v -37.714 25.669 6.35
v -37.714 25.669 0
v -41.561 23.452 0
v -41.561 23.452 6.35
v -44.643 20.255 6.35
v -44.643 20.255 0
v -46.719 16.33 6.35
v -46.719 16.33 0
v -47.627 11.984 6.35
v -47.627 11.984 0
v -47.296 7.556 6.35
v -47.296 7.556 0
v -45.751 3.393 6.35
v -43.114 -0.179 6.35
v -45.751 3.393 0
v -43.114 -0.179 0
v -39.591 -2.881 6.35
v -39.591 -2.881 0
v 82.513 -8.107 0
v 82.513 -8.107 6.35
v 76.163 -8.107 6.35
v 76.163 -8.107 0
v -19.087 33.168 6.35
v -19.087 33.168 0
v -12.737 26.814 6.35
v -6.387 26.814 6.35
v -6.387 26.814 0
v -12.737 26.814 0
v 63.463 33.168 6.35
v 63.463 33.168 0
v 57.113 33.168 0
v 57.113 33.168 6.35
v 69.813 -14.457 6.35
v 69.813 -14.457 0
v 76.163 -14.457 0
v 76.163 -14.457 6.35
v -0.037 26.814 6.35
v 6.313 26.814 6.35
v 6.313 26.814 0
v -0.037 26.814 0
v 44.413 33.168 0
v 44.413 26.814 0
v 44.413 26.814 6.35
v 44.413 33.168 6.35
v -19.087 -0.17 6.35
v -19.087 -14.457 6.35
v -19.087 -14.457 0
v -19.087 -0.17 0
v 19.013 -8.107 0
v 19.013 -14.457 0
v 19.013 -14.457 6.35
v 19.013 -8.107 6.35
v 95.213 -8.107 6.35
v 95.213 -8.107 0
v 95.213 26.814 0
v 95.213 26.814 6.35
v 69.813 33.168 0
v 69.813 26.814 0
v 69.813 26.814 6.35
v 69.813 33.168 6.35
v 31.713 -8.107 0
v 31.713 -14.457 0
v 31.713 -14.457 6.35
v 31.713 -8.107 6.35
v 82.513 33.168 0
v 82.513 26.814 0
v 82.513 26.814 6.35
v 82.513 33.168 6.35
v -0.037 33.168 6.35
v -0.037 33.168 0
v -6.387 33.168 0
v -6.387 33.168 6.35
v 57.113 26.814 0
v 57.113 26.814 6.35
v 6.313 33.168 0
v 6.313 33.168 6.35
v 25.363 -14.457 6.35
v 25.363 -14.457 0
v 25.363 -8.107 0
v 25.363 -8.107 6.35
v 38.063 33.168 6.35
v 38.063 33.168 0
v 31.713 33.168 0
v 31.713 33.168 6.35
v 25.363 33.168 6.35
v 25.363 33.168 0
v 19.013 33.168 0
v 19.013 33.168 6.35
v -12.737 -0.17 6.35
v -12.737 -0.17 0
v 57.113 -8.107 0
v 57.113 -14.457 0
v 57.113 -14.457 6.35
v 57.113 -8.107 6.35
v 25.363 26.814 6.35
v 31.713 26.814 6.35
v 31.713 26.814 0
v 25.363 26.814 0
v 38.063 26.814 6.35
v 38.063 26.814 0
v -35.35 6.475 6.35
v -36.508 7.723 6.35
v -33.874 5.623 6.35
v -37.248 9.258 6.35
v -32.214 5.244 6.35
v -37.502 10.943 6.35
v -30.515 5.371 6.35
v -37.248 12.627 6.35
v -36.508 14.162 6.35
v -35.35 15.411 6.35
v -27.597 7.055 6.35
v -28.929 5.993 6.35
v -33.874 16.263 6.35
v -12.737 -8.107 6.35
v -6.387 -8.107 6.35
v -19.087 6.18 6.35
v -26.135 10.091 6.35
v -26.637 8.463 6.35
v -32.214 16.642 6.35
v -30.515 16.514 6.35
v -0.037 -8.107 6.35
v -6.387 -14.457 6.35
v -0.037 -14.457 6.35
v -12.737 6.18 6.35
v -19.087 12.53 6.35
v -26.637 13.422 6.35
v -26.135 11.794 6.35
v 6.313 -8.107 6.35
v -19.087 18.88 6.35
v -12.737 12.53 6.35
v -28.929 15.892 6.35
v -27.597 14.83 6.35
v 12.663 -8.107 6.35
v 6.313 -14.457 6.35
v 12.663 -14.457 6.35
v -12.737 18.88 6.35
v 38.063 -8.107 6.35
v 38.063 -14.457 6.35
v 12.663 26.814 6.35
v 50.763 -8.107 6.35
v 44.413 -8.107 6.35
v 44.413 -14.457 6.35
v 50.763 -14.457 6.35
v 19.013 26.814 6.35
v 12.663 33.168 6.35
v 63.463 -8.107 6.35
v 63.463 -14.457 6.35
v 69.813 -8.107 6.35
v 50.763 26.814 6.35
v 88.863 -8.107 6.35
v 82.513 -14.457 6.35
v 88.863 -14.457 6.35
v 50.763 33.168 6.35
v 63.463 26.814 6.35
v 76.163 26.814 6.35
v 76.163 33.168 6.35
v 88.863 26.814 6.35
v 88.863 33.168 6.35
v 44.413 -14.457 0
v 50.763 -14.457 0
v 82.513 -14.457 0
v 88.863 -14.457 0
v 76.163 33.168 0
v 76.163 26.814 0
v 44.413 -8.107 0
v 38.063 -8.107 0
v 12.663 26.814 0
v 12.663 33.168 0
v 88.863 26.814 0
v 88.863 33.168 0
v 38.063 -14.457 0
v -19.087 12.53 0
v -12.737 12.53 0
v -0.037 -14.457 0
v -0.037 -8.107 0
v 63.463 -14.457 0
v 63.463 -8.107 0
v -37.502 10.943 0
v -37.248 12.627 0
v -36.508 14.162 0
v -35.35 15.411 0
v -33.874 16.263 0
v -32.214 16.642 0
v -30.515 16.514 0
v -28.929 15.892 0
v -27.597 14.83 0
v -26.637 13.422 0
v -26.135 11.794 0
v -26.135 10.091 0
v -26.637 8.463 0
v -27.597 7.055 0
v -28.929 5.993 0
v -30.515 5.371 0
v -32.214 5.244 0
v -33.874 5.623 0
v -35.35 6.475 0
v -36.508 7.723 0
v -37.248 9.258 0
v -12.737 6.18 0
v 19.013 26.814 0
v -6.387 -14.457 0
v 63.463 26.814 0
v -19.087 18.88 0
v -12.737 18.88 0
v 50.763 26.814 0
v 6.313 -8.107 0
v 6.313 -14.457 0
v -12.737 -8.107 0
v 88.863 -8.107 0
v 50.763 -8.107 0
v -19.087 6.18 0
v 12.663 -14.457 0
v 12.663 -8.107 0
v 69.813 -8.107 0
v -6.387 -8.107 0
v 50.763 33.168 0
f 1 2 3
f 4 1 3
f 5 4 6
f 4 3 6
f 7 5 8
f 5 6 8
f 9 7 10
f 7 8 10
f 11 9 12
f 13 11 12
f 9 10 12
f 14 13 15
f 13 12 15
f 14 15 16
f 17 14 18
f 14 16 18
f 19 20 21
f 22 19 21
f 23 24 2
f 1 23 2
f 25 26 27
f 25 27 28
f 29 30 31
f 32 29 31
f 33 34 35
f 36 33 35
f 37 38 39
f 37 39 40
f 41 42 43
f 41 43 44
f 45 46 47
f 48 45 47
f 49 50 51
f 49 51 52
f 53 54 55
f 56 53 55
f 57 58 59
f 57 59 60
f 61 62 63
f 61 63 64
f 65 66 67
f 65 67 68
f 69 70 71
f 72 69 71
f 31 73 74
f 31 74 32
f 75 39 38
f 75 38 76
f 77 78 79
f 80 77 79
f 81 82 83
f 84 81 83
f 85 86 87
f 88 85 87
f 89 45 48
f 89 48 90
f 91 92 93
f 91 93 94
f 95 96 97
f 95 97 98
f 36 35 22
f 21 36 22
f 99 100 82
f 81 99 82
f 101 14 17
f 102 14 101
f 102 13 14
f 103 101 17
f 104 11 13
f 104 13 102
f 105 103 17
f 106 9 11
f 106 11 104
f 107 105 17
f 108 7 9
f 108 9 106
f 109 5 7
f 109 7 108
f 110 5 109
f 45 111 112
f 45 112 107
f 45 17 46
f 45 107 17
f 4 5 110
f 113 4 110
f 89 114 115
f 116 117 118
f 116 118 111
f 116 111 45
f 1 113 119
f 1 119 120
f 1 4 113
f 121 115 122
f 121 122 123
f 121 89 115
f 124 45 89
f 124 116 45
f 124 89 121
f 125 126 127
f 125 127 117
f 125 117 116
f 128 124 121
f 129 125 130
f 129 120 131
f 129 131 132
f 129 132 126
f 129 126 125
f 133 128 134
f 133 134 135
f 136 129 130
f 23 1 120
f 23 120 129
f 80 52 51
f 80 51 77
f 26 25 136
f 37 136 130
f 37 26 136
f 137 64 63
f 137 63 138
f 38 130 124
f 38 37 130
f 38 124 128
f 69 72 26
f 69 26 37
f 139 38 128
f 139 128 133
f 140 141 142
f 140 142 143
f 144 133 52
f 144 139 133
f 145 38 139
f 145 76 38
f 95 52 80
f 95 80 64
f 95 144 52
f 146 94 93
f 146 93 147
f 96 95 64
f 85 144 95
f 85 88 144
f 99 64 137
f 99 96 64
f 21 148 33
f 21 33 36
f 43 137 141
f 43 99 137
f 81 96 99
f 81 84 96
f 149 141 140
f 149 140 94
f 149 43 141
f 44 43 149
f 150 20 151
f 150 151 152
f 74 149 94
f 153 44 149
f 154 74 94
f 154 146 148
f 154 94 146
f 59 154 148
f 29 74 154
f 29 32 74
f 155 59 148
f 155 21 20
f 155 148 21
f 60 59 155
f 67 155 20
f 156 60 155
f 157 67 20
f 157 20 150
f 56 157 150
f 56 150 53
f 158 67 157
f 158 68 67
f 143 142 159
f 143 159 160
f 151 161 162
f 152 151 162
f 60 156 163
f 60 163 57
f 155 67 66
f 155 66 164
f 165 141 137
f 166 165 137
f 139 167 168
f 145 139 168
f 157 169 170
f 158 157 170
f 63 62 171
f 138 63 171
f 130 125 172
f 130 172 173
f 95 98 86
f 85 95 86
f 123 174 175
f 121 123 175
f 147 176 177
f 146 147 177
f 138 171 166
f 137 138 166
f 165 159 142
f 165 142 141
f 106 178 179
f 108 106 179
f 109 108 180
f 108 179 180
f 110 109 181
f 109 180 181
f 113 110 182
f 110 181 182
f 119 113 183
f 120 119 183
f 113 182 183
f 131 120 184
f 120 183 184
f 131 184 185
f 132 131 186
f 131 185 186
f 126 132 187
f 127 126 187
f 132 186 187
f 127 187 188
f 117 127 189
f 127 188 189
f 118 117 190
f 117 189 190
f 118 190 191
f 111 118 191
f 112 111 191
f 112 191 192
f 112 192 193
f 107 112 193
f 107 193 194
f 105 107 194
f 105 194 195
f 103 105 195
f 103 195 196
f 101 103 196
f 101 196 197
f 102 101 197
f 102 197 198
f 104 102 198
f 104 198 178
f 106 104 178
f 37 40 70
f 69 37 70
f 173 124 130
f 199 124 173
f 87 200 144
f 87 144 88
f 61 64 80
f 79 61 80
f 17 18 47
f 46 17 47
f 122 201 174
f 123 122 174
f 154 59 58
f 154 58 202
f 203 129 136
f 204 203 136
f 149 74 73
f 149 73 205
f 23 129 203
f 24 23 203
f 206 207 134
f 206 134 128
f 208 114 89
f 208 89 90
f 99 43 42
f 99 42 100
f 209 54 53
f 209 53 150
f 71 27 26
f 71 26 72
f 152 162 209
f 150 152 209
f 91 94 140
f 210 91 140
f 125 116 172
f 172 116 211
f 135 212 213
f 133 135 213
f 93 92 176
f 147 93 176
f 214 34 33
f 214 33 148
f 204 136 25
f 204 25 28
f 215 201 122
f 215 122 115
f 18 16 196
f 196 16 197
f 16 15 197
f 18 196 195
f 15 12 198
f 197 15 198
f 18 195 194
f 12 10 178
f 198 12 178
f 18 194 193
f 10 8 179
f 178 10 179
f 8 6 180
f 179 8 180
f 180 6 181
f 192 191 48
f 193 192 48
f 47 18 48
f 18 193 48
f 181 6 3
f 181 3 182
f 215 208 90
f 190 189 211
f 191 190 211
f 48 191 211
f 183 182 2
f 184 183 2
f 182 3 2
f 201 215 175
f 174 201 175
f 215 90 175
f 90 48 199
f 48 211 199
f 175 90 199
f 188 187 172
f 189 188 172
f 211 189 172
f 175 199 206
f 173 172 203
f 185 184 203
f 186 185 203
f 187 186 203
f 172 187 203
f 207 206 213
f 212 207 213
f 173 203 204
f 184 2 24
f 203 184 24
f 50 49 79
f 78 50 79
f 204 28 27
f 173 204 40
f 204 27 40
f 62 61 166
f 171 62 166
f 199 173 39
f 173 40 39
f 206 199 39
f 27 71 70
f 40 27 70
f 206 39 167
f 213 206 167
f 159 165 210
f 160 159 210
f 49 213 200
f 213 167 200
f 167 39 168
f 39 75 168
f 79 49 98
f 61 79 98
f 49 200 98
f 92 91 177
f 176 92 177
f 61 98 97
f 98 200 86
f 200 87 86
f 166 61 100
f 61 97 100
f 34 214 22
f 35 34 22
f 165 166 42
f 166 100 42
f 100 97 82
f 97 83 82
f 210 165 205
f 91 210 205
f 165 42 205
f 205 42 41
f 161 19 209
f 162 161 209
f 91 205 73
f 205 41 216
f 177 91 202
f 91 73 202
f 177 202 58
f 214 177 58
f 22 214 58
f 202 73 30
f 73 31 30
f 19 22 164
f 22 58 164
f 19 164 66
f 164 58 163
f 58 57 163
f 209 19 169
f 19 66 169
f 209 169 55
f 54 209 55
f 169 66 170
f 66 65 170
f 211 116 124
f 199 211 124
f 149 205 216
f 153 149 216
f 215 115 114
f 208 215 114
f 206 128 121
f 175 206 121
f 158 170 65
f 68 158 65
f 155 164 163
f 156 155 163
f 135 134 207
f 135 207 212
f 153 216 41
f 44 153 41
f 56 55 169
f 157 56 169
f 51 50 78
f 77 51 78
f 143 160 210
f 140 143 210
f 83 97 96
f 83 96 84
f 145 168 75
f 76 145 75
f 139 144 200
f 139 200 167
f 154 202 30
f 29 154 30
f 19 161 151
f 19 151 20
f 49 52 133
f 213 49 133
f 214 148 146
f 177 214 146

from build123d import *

# Parameters (mm, degrees)
MASS_DEPTH          = 6.35
SKETCH4_R           = 5.715
CUT_EXTRUDE1_DEPTH  = 102.024858757
SKETCH3_W           = 6.35
SKETCH3_H           = 12.7
CUT_EXTRUDE2_DEPTH  = 102.024858757
CAVITY1_START       = -14.457315323
CAVITY1_OUTLINE_W   = 6.35
CAVITY1_OUTLINE_H   = 6.35
CAVITY1_DEPTH       = 14.2875
CAVITY1_START_2     = 18.880184677
CAVITY1_2_OUTLINE_W = 6.35
CAVITY1_2_OUTLINE_H = 6.35
CAVITY1_2_DEPTH     = 14.2875
CAVITY1_START_3     = 6.180184677
CAVITY1_3_OUTLINE_W = 6.35
CAVITY1_3_OUTLINE_H = 6.35
CAVITY1_3_DEPTH     = 6.35
LPATTERN1_COUNT     = 9
LPATTERN1_PITCH     = 12.7


# Read off the part's stored shape, not the designer's step: Cavity1
with BuildPart() as part:
    # Sketch1 → Mass (new body)
    with BuildSketch(Plane.XY):
        with BuildLine():
            Line((-19.086533096, -14.457315323), (95.213466904, -14.457315323))
            Line((95.213466904, -14.457315323), (95.213466904, 33.167684677))
            Line((95.213466904, 33.167684677), (-19.086533096, 33.167684677))
            Line((-19.086533096, 33.167684677), (-37.714474787, 25.669365644))
            ThreePointArc((-37.714474787, 25.669365644), (-47.627354737, 11.983835347), (-39.590998194, -2.881422872))
            Line((-39.590998194, -2.881422872), (-19.086533096, -14.457315323))
        make_face()
    extrude(amount=MASS_DEPTH)

    # Sketch4 → Cut-Extrude1 (cut, through all)
    with BuildSketch(Plane(origin=(0, 0, 0), x_dir=(-1, 0, 0), z_dir=(0, 0, -1))):
        with Locations((31.786533096, 10.942684677)):
            Circle(SKETCH4_R)
    extrude(amount=-CUT_EXTRUDE1_DEPTH, mode=Mode.SUBTRACT)

    # Sketch3 → Cut-Extrude2 (cut, through all)
    with BuildSketch(Plane(origin=(0, 0, 0), x_dir=(-1, 0, 0), z_dir=(0, 0, -1))):
        with Locations((-92.038466904, 33.164228805)):
            Rectangle(SKETCH3_W, SKETCH3_H)
        with Locations((-92.038466904, -14.457315323)):
            Rectangle(SKETCH3_W, SKETCH3_H)
    cut_extrude2 = extrude(amount=-CUT_EXTRUDE2_DEPTH, mode=Mode.SUBTRACT)

    # Cavity1 outline → Cavity1 (cut)
    with BuildSketch(Plane(origin=(0, 0, 0), x_dir=(1, 0, 0), z_dir=(0, 1, 0)).offset(CAVITY1_START)):
        with Locations((-15.911533096, -3.175)):
            Rectangle(CAVITY1_OUTLINE_W, CAVITY1_OUTLINE_H)
    extrude(amount=CAVITY1_DEPTH, mode=Mode.SUBTRACT)

    # Cavity1 2 outline → Cavity1 2 (cut)
    with BuildSketch(Plane(origin=(0, 0, 0), x_dir=(1, 0, 0), z_dir=(0, 1, 0)).offset(CAVITY1_START_2)):
        with Locations((-15.911533096, -3.175)):
            Rectangle(CAVITY1_2_OUTLINE_W, CAVITY1_2_OUTLINE_H)
    extrude(amount=CAVITY1_2_DEPTH, mode=Mode.SUBTRACT)

    # Cavity1 3 outline → Cavity1 3 (cut)
    with BuildSketch(Plane(origin=(0, 0, 0), x_dir=(1, 0, 0), z_dir=(0, 1, 0)).offset(CAVITY1_START_3)):
        with Locations((-15.911533096, -3.175)):
            Rectangle(CAVITY1_3_OUTLINE_W, CAVITY1_3_OUTLINE_H)
    extrude(amount=CAVITY1_3_DEPTH, mode=Mode.SUBTRACT)

    # LPattern1: Cut-Extrude2 ×9
    with Locations(*[(-i * LPATTERN1_PITCH, 0, 0) for i in range(1, LPATTERN1_COUNT)]):
        add(cut_extrude2, mode=Mode.SUBTRACT)


solid = part.part
